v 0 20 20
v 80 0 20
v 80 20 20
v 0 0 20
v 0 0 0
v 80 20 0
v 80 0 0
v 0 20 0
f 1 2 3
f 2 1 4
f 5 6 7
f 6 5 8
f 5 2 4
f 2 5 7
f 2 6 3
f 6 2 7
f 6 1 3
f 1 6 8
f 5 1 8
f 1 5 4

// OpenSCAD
module PowerBoard(){
    cube([80, 20, 20]);
}

PowerBoard();
